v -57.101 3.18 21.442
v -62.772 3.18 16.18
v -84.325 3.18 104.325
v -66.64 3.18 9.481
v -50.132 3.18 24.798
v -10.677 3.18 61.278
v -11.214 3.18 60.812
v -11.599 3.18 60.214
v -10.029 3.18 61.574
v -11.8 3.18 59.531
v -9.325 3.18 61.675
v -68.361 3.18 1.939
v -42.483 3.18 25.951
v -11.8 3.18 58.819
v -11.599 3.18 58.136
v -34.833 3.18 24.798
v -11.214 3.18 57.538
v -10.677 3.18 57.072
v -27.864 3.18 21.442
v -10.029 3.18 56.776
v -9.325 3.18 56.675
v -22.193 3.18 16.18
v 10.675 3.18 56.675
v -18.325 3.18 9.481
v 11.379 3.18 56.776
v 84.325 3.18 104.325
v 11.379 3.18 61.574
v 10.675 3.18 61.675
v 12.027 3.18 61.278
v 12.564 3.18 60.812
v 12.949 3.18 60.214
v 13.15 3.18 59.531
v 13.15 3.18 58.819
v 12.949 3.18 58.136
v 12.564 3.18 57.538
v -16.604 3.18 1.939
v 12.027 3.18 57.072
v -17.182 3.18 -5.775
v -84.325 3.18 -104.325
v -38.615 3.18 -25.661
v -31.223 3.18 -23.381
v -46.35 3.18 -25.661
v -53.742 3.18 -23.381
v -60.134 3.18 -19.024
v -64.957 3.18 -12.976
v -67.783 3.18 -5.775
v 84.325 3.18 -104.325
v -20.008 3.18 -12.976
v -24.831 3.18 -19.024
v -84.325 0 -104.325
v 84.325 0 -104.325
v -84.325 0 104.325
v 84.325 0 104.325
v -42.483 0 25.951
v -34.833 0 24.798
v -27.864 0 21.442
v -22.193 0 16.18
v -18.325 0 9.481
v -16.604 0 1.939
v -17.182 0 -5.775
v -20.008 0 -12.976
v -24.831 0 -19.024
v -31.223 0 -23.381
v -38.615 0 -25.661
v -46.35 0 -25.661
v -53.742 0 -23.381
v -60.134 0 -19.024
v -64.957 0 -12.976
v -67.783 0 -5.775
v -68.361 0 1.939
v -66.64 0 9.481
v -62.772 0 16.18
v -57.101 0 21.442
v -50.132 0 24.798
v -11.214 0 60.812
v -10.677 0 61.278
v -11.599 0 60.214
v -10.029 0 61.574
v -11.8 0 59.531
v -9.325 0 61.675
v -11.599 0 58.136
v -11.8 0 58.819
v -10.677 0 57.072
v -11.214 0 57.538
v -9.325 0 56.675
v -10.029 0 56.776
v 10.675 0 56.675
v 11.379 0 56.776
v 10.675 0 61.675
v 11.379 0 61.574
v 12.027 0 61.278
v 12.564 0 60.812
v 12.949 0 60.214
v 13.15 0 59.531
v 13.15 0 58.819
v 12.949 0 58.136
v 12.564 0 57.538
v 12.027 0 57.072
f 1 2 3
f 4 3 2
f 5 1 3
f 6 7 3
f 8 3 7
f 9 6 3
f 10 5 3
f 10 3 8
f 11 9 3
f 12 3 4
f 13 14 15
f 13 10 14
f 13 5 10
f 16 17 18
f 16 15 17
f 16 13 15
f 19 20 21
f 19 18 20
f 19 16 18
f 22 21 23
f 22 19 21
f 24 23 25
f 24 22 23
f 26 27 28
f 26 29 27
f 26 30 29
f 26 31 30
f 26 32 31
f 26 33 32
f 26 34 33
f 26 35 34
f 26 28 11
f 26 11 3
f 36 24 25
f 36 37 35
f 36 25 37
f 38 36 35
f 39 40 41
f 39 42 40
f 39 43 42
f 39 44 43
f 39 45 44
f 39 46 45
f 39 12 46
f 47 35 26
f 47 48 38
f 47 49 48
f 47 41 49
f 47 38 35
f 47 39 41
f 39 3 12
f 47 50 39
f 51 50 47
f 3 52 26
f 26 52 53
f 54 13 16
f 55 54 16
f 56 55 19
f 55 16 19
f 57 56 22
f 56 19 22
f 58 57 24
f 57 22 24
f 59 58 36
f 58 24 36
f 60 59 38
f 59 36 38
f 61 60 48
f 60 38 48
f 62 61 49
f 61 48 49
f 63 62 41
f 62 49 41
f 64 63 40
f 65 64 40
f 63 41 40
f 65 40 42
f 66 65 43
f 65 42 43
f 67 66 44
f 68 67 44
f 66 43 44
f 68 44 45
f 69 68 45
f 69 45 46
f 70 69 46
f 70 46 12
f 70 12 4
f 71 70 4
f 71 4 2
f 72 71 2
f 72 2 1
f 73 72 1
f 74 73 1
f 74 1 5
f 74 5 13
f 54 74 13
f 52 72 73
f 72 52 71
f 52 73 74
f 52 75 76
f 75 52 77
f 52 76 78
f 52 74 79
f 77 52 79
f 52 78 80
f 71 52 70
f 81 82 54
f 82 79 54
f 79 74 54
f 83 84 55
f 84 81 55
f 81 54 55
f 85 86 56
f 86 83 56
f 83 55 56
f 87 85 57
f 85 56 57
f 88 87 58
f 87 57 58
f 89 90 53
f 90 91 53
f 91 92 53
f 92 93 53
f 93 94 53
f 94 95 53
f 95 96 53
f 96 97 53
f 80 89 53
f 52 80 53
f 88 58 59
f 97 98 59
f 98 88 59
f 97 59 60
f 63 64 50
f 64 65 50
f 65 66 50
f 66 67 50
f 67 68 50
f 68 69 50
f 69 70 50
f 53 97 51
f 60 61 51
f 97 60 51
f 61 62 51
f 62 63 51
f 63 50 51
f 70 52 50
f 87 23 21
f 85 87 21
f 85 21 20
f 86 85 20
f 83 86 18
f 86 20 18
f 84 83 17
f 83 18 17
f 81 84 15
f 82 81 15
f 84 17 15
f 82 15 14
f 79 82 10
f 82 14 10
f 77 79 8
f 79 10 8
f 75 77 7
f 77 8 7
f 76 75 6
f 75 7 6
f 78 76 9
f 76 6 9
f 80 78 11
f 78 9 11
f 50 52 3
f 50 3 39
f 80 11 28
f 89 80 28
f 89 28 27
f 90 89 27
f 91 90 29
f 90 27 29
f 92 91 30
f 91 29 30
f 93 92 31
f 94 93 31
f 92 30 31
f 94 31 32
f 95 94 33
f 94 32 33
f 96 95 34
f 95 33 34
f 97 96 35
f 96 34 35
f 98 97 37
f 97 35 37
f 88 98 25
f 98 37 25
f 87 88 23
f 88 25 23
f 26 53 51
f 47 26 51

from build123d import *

# Parameters (mm, degrees)
SKETCH1_W           = 168.65
SKETCH1_H           = 208.65
BOSS_EXTRUDE1_DEPTH = 3.18
CUT_EXTRUDE1_REACH  = 136.181
CUT_EXTRUDE24_REACH = 136.181
SKETCH45_R          = 25.951103398


with BuildPart() as part:
    # Sketch1 → Boss-Extrude1 (new body)
    with BuildSketch(Plane(origin=(0, 0, 0), x_dir=(1, 0, 0), z_dir=(0, 1, 0))):
        Rectangle(SKETCH1_W, SKETCH1_H)
    extrude(amount=BOSS_EXTRUDE1_DEPTH)

    # Sketch2 → Cut-Extrude1 (cut, up to next)
    with BuildSketch(Plane(origin=(0, 3.18, 0), x_dir=(1, 0, 0), z_dir=(0, 1, 0)), mode=Mode.PRIVATE) as cut_extrude1_sk1:
        with BuildLine():
            Line((10.675, -56.675), (-9.325, -56.675))
            ThreePointArc((-9.325, -56.675), (-11.825, -59.175), (-9.325, -61.675))
            Line((-9.325, -61.675), (10.675, -61.675))
            ThreePointArc((10.675, -61.675), (13.175, -59.175), (10.675, -56.675))
        make_face()
    cut_extrude1_tool1 = extrude(cut_extrude1_sk1.sketch, amount=-CUT_EXTRUDE1_REACH, mode=Mode.PRIVATE) & part.part
    add(cut_extrude1_tool1.solids().sort_by_distance((0.675, 3.18, 59.175))[0], mode=Mode.SUBTRACT)

    # Sketch45 → Cut-Extrude24 (cut, up to next)
    with BuildSketch(Plane(origin=(0, 3.18, 0), x_dir=(1, 0, 0), z_dir=(0, 1, 0)), mode=Mode.PRIVATE) as cut_extrude24_sk1:
        with Locations(Location((-42.4825, 0, 0), (0, 0, 270))):
            Circle(SKETCH45_R)
    cut_extrude24_tool1 = extrude(cut_extrude24_sk1.sketch, amount=-CUT_EXTRUDE24_REACH, mode=Mode.PRIVATE) & part.part
    add(cut_extrude24_tool1.solids().sort_by_distance((-42.4825, 3.18, 0))[0], mode=Mode.SUBTRACT)


solid = part.part
